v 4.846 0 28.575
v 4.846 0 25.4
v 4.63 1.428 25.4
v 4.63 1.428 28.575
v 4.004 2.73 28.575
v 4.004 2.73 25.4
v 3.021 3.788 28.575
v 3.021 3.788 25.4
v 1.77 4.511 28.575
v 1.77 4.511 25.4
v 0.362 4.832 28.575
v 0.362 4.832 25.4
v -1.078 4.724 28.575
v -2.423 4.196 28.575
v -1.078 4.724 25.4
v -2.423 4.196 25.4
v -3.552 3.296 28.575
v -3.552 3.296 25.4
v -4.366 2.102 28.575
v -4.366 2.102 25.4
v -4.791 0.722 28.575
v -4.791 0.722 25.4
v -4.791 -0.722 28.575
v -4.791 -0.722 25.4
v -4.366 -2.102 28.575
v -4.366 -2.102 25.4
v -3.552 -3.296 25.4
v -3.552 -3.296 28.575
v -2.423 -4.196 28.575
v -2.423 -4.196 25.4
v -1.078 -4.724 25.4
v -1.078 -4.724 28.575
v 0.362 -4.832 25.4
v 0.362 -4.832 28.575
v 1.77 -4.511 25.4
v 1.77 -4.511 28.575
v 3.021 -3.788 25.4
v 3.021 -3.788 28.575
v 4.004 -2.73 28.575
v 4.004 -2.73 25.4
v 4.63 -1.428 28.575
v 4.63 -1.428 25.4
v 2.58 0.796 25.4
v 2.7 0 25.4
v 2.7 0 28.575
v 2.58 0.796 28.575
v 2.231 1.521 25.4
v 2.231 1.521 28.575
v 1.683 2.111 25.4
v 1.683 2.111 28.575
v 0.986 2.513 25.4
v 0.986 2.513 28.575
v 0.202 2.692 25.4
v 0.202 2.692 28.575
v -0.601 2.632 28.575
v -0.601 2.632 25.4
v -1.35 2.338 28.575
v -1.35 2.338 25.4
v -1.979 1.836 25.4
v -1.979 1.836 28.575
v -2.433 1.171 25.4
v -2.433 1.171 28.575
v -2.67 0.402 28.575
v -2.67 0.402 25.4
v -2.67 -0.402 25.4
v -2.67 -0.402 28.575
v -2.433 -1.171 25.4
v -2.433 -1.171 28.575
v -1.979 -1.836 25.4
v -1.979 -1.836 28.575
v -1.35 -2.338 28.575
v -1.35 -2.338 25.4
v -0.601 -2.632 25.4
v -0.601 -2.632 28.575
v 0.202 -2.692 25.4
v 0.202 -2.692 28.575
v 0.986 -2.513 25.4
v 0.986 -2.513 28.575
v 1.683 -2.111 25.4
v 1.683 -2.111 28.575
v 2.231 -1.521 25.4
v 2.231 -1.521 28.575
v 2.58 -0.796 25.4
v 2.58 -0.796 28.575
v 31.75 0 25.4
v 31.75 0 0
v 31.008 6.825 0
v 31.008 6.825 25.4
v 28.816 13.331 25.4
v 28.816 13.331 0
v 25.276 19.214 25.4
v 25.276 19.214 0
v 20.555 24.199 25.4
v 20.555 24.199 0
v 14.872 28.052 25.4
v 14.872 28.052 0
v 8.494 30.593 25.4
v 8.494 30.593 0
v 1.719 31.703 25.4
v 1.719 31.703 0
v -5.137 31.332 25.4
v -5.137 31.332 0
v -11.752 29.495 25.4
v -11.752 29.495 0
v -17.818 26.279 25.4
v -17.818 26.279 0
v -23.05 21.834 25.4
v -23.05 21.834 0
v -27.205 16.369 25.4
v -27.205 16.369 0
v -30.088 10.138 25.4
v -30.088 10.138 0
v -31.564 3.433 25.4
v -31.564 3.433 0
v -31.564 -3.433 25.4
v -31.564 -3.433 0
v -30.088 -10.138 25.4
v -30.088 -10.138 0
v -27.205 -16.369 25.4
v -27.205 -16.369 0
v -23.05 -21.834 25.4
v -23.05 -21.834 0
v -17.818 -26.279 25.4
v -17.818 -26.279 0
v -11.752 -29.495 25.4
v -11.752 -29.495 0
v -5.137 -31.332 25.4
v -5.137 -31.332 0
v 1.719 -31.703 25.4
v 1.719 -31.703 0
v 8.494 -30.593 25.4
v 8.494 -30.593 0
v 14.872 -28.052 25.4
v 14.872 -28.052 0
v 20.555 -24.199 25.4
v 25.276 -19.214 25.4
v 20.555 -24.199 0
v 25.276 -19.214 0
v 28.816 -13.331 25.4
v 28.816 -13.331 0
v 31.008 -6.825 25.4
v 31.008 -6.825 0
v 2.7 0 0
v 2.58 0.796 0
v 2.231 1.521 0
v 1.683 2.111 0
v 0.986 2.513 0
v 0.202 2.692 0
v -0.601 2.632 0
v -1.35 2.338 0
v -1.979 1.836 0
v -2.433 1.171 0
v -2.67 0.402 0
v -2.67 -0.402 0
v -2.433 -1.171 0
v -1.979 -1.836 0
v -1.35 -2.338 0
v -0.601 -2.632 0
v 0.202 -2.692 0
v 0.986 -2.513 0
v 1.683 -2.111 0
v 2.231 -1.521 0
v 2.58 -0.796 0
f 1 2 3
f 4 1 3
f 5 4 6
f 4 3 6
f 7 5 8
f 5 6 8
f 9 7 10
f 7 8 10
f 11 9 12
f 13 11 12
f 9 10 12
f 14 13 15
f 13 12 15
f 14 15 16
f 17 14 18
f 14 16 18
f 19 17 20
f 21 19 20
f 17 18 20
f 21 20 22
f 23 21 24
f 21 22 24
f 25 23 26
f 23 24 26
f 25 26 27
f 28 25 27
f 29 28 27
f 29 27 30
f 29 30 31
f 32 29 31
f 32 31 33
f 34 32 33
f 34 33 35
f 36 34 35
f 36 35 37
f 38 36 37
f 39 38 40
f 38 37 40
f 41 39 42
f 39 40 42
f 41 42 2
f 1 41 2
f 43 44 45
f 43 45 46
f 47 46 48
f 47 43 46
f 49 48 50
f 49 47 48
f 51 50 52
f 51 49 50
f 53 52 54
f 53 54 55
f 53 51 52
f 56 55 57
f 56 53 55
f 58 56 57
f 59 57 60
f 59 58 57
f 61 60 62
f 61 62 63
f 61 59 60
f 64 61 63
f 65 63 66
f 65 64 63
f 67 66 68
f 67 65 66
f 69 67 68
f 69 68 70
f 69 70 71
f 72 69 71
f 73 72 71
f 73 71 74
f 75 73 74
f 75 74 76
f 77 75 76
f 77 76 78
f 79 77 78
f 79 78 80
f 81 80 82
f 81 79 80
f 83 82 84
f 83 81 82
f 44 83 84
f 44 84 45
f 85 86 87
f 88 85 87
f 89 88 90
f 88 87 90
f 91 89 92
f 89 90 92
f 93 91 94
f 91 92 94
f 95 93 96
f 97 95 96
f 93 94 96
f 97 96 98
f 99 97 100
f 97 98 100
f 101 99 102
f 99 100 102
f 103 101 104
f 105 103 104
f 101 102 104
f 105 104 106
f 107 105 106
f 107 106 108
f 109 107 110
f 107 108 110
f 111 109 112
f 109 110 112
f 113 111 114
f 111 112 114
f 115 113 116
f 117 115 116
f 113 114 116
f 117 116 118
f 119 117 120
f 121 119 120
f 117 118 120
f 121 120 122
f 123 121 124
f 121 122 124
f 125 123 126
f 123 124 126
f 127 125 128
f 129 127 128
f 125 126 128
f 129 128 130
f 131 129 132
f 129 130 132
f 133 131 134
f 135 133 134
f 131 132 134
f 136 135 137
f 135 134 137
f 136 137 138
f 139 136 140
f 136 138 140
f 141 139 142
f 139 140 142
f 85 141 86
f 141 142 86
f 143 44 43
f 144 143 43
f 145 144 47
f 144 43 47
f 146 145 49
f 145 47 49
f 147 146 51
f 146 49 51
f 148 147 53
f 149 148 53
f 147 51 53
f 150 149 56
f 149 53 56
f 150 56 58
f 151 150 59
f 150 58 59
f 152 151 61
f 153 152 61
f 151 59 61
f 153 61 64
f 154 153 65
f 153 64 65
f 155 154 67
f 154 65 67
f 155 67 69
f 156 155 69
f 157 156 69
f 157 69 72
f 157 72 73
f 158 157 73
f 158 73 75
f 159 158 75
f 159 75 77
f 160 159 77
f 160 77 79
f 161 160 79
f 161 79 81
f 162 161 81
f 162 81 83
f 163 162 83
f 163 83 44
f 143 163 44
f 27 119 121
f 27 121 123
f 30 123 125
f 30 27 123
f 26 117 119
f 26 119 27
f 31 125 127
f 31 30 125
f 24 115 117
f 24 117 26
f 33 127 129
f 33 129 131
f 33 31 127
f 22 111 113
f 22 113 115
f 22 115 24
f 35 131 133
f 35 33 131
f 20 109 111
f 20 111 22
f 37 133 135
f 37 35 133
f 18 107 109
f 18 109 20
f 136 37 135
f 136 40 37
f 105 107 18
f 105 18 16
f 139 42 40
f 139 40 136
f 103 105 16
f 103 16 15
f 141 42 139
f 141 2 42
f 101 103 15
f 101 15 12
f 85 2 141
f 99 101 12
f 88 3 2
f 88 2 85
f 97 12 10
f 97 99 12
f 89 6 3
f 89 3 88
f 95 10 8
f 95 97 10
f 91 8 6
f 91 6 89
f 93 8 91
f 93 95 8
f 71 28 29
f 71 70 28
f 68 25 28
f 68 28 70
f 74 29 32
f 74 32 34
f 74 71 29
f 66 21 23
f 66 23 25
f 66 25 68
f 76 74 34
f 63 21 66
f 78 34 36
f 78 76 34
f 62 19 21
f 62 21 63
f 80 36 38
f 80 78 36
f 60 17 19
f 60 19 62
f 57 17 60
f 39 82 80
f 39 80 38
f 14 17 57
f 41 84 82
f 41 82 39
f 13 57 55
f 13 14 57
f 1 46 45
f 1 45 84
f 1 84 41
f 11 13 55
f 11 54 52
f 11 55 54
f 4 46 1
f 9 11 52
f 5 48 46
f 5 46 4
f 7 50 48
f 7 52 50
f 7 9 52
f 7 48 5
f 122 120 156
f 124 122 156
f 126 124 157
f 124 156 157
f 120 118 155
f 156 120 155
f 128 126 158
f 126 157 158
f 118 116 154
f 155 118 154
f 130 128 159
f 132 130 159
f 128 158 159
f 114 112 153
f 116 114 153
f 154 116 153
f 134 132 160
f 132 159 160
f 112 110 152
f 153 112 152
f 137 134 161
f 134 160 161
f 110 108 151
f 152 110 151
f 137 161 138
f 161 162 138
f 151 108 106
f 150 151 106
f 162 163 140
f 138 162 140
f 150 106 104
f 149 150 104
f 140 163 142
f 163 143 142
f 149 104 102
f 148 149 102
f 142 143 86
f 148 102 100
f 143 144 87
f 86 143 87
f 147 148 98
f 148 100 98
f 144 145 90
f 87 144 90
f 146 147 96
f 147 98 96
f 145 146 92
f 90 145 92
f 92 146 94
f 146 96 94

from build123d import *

# Parameters (mm, degrees)
SKETCH1_R           = 31.75
BOSS_EXTRUDE1_DEPTH = 25.4
SKETCH2_R           = 4.845598066
SKETCH2_R_2         = 2.7
BOSS_EXTRUDE2_DEPTH = 3.175
CUT_EXTRUDE1_REACH  = 53.588
SKETCH3_R           = 2.7


with BuildPart() as part:
    # Sketch1 → Boss-Extrude1 (new body)
    with BuildSketch(Plane.XY):
        Circle(SKETCH1_R)
    extrude(amount=BOSS_EXTRUDE1_DEPTH)

    # Sketch2 → Boss-Extrude2 (add)
    with BuildSketch(Plane.XY.offset(25.4)):
        Circle(SKETCH2_R)
        Circle(SKETCH2_R_2, mode=Mode.SUBTRACT)
    extrude(amount=BOSS_EXTRUDE2_DEPTH)

    # Sketch3 → Cut-Extrude1 (cut, up to next)
    with BuildSketch(Plane.XY.offset(25.4), mode=Mode.PRIVATE) as cut_extrude1_sk1:
        Circle(SKETCH3_R)
    cut_extrude1_tool1 = extrude(cut_extrude1_sk1.sketch, amount=-CUT_EXTRUDE1_REACH, mode=Mode.PRIVATE) & part.part
    add(cut_extrude1_tool1.solids().sort_by_distance((0, 0, 25.4))[0], mode=Mode.SUBTRACT)


solid = part.part
